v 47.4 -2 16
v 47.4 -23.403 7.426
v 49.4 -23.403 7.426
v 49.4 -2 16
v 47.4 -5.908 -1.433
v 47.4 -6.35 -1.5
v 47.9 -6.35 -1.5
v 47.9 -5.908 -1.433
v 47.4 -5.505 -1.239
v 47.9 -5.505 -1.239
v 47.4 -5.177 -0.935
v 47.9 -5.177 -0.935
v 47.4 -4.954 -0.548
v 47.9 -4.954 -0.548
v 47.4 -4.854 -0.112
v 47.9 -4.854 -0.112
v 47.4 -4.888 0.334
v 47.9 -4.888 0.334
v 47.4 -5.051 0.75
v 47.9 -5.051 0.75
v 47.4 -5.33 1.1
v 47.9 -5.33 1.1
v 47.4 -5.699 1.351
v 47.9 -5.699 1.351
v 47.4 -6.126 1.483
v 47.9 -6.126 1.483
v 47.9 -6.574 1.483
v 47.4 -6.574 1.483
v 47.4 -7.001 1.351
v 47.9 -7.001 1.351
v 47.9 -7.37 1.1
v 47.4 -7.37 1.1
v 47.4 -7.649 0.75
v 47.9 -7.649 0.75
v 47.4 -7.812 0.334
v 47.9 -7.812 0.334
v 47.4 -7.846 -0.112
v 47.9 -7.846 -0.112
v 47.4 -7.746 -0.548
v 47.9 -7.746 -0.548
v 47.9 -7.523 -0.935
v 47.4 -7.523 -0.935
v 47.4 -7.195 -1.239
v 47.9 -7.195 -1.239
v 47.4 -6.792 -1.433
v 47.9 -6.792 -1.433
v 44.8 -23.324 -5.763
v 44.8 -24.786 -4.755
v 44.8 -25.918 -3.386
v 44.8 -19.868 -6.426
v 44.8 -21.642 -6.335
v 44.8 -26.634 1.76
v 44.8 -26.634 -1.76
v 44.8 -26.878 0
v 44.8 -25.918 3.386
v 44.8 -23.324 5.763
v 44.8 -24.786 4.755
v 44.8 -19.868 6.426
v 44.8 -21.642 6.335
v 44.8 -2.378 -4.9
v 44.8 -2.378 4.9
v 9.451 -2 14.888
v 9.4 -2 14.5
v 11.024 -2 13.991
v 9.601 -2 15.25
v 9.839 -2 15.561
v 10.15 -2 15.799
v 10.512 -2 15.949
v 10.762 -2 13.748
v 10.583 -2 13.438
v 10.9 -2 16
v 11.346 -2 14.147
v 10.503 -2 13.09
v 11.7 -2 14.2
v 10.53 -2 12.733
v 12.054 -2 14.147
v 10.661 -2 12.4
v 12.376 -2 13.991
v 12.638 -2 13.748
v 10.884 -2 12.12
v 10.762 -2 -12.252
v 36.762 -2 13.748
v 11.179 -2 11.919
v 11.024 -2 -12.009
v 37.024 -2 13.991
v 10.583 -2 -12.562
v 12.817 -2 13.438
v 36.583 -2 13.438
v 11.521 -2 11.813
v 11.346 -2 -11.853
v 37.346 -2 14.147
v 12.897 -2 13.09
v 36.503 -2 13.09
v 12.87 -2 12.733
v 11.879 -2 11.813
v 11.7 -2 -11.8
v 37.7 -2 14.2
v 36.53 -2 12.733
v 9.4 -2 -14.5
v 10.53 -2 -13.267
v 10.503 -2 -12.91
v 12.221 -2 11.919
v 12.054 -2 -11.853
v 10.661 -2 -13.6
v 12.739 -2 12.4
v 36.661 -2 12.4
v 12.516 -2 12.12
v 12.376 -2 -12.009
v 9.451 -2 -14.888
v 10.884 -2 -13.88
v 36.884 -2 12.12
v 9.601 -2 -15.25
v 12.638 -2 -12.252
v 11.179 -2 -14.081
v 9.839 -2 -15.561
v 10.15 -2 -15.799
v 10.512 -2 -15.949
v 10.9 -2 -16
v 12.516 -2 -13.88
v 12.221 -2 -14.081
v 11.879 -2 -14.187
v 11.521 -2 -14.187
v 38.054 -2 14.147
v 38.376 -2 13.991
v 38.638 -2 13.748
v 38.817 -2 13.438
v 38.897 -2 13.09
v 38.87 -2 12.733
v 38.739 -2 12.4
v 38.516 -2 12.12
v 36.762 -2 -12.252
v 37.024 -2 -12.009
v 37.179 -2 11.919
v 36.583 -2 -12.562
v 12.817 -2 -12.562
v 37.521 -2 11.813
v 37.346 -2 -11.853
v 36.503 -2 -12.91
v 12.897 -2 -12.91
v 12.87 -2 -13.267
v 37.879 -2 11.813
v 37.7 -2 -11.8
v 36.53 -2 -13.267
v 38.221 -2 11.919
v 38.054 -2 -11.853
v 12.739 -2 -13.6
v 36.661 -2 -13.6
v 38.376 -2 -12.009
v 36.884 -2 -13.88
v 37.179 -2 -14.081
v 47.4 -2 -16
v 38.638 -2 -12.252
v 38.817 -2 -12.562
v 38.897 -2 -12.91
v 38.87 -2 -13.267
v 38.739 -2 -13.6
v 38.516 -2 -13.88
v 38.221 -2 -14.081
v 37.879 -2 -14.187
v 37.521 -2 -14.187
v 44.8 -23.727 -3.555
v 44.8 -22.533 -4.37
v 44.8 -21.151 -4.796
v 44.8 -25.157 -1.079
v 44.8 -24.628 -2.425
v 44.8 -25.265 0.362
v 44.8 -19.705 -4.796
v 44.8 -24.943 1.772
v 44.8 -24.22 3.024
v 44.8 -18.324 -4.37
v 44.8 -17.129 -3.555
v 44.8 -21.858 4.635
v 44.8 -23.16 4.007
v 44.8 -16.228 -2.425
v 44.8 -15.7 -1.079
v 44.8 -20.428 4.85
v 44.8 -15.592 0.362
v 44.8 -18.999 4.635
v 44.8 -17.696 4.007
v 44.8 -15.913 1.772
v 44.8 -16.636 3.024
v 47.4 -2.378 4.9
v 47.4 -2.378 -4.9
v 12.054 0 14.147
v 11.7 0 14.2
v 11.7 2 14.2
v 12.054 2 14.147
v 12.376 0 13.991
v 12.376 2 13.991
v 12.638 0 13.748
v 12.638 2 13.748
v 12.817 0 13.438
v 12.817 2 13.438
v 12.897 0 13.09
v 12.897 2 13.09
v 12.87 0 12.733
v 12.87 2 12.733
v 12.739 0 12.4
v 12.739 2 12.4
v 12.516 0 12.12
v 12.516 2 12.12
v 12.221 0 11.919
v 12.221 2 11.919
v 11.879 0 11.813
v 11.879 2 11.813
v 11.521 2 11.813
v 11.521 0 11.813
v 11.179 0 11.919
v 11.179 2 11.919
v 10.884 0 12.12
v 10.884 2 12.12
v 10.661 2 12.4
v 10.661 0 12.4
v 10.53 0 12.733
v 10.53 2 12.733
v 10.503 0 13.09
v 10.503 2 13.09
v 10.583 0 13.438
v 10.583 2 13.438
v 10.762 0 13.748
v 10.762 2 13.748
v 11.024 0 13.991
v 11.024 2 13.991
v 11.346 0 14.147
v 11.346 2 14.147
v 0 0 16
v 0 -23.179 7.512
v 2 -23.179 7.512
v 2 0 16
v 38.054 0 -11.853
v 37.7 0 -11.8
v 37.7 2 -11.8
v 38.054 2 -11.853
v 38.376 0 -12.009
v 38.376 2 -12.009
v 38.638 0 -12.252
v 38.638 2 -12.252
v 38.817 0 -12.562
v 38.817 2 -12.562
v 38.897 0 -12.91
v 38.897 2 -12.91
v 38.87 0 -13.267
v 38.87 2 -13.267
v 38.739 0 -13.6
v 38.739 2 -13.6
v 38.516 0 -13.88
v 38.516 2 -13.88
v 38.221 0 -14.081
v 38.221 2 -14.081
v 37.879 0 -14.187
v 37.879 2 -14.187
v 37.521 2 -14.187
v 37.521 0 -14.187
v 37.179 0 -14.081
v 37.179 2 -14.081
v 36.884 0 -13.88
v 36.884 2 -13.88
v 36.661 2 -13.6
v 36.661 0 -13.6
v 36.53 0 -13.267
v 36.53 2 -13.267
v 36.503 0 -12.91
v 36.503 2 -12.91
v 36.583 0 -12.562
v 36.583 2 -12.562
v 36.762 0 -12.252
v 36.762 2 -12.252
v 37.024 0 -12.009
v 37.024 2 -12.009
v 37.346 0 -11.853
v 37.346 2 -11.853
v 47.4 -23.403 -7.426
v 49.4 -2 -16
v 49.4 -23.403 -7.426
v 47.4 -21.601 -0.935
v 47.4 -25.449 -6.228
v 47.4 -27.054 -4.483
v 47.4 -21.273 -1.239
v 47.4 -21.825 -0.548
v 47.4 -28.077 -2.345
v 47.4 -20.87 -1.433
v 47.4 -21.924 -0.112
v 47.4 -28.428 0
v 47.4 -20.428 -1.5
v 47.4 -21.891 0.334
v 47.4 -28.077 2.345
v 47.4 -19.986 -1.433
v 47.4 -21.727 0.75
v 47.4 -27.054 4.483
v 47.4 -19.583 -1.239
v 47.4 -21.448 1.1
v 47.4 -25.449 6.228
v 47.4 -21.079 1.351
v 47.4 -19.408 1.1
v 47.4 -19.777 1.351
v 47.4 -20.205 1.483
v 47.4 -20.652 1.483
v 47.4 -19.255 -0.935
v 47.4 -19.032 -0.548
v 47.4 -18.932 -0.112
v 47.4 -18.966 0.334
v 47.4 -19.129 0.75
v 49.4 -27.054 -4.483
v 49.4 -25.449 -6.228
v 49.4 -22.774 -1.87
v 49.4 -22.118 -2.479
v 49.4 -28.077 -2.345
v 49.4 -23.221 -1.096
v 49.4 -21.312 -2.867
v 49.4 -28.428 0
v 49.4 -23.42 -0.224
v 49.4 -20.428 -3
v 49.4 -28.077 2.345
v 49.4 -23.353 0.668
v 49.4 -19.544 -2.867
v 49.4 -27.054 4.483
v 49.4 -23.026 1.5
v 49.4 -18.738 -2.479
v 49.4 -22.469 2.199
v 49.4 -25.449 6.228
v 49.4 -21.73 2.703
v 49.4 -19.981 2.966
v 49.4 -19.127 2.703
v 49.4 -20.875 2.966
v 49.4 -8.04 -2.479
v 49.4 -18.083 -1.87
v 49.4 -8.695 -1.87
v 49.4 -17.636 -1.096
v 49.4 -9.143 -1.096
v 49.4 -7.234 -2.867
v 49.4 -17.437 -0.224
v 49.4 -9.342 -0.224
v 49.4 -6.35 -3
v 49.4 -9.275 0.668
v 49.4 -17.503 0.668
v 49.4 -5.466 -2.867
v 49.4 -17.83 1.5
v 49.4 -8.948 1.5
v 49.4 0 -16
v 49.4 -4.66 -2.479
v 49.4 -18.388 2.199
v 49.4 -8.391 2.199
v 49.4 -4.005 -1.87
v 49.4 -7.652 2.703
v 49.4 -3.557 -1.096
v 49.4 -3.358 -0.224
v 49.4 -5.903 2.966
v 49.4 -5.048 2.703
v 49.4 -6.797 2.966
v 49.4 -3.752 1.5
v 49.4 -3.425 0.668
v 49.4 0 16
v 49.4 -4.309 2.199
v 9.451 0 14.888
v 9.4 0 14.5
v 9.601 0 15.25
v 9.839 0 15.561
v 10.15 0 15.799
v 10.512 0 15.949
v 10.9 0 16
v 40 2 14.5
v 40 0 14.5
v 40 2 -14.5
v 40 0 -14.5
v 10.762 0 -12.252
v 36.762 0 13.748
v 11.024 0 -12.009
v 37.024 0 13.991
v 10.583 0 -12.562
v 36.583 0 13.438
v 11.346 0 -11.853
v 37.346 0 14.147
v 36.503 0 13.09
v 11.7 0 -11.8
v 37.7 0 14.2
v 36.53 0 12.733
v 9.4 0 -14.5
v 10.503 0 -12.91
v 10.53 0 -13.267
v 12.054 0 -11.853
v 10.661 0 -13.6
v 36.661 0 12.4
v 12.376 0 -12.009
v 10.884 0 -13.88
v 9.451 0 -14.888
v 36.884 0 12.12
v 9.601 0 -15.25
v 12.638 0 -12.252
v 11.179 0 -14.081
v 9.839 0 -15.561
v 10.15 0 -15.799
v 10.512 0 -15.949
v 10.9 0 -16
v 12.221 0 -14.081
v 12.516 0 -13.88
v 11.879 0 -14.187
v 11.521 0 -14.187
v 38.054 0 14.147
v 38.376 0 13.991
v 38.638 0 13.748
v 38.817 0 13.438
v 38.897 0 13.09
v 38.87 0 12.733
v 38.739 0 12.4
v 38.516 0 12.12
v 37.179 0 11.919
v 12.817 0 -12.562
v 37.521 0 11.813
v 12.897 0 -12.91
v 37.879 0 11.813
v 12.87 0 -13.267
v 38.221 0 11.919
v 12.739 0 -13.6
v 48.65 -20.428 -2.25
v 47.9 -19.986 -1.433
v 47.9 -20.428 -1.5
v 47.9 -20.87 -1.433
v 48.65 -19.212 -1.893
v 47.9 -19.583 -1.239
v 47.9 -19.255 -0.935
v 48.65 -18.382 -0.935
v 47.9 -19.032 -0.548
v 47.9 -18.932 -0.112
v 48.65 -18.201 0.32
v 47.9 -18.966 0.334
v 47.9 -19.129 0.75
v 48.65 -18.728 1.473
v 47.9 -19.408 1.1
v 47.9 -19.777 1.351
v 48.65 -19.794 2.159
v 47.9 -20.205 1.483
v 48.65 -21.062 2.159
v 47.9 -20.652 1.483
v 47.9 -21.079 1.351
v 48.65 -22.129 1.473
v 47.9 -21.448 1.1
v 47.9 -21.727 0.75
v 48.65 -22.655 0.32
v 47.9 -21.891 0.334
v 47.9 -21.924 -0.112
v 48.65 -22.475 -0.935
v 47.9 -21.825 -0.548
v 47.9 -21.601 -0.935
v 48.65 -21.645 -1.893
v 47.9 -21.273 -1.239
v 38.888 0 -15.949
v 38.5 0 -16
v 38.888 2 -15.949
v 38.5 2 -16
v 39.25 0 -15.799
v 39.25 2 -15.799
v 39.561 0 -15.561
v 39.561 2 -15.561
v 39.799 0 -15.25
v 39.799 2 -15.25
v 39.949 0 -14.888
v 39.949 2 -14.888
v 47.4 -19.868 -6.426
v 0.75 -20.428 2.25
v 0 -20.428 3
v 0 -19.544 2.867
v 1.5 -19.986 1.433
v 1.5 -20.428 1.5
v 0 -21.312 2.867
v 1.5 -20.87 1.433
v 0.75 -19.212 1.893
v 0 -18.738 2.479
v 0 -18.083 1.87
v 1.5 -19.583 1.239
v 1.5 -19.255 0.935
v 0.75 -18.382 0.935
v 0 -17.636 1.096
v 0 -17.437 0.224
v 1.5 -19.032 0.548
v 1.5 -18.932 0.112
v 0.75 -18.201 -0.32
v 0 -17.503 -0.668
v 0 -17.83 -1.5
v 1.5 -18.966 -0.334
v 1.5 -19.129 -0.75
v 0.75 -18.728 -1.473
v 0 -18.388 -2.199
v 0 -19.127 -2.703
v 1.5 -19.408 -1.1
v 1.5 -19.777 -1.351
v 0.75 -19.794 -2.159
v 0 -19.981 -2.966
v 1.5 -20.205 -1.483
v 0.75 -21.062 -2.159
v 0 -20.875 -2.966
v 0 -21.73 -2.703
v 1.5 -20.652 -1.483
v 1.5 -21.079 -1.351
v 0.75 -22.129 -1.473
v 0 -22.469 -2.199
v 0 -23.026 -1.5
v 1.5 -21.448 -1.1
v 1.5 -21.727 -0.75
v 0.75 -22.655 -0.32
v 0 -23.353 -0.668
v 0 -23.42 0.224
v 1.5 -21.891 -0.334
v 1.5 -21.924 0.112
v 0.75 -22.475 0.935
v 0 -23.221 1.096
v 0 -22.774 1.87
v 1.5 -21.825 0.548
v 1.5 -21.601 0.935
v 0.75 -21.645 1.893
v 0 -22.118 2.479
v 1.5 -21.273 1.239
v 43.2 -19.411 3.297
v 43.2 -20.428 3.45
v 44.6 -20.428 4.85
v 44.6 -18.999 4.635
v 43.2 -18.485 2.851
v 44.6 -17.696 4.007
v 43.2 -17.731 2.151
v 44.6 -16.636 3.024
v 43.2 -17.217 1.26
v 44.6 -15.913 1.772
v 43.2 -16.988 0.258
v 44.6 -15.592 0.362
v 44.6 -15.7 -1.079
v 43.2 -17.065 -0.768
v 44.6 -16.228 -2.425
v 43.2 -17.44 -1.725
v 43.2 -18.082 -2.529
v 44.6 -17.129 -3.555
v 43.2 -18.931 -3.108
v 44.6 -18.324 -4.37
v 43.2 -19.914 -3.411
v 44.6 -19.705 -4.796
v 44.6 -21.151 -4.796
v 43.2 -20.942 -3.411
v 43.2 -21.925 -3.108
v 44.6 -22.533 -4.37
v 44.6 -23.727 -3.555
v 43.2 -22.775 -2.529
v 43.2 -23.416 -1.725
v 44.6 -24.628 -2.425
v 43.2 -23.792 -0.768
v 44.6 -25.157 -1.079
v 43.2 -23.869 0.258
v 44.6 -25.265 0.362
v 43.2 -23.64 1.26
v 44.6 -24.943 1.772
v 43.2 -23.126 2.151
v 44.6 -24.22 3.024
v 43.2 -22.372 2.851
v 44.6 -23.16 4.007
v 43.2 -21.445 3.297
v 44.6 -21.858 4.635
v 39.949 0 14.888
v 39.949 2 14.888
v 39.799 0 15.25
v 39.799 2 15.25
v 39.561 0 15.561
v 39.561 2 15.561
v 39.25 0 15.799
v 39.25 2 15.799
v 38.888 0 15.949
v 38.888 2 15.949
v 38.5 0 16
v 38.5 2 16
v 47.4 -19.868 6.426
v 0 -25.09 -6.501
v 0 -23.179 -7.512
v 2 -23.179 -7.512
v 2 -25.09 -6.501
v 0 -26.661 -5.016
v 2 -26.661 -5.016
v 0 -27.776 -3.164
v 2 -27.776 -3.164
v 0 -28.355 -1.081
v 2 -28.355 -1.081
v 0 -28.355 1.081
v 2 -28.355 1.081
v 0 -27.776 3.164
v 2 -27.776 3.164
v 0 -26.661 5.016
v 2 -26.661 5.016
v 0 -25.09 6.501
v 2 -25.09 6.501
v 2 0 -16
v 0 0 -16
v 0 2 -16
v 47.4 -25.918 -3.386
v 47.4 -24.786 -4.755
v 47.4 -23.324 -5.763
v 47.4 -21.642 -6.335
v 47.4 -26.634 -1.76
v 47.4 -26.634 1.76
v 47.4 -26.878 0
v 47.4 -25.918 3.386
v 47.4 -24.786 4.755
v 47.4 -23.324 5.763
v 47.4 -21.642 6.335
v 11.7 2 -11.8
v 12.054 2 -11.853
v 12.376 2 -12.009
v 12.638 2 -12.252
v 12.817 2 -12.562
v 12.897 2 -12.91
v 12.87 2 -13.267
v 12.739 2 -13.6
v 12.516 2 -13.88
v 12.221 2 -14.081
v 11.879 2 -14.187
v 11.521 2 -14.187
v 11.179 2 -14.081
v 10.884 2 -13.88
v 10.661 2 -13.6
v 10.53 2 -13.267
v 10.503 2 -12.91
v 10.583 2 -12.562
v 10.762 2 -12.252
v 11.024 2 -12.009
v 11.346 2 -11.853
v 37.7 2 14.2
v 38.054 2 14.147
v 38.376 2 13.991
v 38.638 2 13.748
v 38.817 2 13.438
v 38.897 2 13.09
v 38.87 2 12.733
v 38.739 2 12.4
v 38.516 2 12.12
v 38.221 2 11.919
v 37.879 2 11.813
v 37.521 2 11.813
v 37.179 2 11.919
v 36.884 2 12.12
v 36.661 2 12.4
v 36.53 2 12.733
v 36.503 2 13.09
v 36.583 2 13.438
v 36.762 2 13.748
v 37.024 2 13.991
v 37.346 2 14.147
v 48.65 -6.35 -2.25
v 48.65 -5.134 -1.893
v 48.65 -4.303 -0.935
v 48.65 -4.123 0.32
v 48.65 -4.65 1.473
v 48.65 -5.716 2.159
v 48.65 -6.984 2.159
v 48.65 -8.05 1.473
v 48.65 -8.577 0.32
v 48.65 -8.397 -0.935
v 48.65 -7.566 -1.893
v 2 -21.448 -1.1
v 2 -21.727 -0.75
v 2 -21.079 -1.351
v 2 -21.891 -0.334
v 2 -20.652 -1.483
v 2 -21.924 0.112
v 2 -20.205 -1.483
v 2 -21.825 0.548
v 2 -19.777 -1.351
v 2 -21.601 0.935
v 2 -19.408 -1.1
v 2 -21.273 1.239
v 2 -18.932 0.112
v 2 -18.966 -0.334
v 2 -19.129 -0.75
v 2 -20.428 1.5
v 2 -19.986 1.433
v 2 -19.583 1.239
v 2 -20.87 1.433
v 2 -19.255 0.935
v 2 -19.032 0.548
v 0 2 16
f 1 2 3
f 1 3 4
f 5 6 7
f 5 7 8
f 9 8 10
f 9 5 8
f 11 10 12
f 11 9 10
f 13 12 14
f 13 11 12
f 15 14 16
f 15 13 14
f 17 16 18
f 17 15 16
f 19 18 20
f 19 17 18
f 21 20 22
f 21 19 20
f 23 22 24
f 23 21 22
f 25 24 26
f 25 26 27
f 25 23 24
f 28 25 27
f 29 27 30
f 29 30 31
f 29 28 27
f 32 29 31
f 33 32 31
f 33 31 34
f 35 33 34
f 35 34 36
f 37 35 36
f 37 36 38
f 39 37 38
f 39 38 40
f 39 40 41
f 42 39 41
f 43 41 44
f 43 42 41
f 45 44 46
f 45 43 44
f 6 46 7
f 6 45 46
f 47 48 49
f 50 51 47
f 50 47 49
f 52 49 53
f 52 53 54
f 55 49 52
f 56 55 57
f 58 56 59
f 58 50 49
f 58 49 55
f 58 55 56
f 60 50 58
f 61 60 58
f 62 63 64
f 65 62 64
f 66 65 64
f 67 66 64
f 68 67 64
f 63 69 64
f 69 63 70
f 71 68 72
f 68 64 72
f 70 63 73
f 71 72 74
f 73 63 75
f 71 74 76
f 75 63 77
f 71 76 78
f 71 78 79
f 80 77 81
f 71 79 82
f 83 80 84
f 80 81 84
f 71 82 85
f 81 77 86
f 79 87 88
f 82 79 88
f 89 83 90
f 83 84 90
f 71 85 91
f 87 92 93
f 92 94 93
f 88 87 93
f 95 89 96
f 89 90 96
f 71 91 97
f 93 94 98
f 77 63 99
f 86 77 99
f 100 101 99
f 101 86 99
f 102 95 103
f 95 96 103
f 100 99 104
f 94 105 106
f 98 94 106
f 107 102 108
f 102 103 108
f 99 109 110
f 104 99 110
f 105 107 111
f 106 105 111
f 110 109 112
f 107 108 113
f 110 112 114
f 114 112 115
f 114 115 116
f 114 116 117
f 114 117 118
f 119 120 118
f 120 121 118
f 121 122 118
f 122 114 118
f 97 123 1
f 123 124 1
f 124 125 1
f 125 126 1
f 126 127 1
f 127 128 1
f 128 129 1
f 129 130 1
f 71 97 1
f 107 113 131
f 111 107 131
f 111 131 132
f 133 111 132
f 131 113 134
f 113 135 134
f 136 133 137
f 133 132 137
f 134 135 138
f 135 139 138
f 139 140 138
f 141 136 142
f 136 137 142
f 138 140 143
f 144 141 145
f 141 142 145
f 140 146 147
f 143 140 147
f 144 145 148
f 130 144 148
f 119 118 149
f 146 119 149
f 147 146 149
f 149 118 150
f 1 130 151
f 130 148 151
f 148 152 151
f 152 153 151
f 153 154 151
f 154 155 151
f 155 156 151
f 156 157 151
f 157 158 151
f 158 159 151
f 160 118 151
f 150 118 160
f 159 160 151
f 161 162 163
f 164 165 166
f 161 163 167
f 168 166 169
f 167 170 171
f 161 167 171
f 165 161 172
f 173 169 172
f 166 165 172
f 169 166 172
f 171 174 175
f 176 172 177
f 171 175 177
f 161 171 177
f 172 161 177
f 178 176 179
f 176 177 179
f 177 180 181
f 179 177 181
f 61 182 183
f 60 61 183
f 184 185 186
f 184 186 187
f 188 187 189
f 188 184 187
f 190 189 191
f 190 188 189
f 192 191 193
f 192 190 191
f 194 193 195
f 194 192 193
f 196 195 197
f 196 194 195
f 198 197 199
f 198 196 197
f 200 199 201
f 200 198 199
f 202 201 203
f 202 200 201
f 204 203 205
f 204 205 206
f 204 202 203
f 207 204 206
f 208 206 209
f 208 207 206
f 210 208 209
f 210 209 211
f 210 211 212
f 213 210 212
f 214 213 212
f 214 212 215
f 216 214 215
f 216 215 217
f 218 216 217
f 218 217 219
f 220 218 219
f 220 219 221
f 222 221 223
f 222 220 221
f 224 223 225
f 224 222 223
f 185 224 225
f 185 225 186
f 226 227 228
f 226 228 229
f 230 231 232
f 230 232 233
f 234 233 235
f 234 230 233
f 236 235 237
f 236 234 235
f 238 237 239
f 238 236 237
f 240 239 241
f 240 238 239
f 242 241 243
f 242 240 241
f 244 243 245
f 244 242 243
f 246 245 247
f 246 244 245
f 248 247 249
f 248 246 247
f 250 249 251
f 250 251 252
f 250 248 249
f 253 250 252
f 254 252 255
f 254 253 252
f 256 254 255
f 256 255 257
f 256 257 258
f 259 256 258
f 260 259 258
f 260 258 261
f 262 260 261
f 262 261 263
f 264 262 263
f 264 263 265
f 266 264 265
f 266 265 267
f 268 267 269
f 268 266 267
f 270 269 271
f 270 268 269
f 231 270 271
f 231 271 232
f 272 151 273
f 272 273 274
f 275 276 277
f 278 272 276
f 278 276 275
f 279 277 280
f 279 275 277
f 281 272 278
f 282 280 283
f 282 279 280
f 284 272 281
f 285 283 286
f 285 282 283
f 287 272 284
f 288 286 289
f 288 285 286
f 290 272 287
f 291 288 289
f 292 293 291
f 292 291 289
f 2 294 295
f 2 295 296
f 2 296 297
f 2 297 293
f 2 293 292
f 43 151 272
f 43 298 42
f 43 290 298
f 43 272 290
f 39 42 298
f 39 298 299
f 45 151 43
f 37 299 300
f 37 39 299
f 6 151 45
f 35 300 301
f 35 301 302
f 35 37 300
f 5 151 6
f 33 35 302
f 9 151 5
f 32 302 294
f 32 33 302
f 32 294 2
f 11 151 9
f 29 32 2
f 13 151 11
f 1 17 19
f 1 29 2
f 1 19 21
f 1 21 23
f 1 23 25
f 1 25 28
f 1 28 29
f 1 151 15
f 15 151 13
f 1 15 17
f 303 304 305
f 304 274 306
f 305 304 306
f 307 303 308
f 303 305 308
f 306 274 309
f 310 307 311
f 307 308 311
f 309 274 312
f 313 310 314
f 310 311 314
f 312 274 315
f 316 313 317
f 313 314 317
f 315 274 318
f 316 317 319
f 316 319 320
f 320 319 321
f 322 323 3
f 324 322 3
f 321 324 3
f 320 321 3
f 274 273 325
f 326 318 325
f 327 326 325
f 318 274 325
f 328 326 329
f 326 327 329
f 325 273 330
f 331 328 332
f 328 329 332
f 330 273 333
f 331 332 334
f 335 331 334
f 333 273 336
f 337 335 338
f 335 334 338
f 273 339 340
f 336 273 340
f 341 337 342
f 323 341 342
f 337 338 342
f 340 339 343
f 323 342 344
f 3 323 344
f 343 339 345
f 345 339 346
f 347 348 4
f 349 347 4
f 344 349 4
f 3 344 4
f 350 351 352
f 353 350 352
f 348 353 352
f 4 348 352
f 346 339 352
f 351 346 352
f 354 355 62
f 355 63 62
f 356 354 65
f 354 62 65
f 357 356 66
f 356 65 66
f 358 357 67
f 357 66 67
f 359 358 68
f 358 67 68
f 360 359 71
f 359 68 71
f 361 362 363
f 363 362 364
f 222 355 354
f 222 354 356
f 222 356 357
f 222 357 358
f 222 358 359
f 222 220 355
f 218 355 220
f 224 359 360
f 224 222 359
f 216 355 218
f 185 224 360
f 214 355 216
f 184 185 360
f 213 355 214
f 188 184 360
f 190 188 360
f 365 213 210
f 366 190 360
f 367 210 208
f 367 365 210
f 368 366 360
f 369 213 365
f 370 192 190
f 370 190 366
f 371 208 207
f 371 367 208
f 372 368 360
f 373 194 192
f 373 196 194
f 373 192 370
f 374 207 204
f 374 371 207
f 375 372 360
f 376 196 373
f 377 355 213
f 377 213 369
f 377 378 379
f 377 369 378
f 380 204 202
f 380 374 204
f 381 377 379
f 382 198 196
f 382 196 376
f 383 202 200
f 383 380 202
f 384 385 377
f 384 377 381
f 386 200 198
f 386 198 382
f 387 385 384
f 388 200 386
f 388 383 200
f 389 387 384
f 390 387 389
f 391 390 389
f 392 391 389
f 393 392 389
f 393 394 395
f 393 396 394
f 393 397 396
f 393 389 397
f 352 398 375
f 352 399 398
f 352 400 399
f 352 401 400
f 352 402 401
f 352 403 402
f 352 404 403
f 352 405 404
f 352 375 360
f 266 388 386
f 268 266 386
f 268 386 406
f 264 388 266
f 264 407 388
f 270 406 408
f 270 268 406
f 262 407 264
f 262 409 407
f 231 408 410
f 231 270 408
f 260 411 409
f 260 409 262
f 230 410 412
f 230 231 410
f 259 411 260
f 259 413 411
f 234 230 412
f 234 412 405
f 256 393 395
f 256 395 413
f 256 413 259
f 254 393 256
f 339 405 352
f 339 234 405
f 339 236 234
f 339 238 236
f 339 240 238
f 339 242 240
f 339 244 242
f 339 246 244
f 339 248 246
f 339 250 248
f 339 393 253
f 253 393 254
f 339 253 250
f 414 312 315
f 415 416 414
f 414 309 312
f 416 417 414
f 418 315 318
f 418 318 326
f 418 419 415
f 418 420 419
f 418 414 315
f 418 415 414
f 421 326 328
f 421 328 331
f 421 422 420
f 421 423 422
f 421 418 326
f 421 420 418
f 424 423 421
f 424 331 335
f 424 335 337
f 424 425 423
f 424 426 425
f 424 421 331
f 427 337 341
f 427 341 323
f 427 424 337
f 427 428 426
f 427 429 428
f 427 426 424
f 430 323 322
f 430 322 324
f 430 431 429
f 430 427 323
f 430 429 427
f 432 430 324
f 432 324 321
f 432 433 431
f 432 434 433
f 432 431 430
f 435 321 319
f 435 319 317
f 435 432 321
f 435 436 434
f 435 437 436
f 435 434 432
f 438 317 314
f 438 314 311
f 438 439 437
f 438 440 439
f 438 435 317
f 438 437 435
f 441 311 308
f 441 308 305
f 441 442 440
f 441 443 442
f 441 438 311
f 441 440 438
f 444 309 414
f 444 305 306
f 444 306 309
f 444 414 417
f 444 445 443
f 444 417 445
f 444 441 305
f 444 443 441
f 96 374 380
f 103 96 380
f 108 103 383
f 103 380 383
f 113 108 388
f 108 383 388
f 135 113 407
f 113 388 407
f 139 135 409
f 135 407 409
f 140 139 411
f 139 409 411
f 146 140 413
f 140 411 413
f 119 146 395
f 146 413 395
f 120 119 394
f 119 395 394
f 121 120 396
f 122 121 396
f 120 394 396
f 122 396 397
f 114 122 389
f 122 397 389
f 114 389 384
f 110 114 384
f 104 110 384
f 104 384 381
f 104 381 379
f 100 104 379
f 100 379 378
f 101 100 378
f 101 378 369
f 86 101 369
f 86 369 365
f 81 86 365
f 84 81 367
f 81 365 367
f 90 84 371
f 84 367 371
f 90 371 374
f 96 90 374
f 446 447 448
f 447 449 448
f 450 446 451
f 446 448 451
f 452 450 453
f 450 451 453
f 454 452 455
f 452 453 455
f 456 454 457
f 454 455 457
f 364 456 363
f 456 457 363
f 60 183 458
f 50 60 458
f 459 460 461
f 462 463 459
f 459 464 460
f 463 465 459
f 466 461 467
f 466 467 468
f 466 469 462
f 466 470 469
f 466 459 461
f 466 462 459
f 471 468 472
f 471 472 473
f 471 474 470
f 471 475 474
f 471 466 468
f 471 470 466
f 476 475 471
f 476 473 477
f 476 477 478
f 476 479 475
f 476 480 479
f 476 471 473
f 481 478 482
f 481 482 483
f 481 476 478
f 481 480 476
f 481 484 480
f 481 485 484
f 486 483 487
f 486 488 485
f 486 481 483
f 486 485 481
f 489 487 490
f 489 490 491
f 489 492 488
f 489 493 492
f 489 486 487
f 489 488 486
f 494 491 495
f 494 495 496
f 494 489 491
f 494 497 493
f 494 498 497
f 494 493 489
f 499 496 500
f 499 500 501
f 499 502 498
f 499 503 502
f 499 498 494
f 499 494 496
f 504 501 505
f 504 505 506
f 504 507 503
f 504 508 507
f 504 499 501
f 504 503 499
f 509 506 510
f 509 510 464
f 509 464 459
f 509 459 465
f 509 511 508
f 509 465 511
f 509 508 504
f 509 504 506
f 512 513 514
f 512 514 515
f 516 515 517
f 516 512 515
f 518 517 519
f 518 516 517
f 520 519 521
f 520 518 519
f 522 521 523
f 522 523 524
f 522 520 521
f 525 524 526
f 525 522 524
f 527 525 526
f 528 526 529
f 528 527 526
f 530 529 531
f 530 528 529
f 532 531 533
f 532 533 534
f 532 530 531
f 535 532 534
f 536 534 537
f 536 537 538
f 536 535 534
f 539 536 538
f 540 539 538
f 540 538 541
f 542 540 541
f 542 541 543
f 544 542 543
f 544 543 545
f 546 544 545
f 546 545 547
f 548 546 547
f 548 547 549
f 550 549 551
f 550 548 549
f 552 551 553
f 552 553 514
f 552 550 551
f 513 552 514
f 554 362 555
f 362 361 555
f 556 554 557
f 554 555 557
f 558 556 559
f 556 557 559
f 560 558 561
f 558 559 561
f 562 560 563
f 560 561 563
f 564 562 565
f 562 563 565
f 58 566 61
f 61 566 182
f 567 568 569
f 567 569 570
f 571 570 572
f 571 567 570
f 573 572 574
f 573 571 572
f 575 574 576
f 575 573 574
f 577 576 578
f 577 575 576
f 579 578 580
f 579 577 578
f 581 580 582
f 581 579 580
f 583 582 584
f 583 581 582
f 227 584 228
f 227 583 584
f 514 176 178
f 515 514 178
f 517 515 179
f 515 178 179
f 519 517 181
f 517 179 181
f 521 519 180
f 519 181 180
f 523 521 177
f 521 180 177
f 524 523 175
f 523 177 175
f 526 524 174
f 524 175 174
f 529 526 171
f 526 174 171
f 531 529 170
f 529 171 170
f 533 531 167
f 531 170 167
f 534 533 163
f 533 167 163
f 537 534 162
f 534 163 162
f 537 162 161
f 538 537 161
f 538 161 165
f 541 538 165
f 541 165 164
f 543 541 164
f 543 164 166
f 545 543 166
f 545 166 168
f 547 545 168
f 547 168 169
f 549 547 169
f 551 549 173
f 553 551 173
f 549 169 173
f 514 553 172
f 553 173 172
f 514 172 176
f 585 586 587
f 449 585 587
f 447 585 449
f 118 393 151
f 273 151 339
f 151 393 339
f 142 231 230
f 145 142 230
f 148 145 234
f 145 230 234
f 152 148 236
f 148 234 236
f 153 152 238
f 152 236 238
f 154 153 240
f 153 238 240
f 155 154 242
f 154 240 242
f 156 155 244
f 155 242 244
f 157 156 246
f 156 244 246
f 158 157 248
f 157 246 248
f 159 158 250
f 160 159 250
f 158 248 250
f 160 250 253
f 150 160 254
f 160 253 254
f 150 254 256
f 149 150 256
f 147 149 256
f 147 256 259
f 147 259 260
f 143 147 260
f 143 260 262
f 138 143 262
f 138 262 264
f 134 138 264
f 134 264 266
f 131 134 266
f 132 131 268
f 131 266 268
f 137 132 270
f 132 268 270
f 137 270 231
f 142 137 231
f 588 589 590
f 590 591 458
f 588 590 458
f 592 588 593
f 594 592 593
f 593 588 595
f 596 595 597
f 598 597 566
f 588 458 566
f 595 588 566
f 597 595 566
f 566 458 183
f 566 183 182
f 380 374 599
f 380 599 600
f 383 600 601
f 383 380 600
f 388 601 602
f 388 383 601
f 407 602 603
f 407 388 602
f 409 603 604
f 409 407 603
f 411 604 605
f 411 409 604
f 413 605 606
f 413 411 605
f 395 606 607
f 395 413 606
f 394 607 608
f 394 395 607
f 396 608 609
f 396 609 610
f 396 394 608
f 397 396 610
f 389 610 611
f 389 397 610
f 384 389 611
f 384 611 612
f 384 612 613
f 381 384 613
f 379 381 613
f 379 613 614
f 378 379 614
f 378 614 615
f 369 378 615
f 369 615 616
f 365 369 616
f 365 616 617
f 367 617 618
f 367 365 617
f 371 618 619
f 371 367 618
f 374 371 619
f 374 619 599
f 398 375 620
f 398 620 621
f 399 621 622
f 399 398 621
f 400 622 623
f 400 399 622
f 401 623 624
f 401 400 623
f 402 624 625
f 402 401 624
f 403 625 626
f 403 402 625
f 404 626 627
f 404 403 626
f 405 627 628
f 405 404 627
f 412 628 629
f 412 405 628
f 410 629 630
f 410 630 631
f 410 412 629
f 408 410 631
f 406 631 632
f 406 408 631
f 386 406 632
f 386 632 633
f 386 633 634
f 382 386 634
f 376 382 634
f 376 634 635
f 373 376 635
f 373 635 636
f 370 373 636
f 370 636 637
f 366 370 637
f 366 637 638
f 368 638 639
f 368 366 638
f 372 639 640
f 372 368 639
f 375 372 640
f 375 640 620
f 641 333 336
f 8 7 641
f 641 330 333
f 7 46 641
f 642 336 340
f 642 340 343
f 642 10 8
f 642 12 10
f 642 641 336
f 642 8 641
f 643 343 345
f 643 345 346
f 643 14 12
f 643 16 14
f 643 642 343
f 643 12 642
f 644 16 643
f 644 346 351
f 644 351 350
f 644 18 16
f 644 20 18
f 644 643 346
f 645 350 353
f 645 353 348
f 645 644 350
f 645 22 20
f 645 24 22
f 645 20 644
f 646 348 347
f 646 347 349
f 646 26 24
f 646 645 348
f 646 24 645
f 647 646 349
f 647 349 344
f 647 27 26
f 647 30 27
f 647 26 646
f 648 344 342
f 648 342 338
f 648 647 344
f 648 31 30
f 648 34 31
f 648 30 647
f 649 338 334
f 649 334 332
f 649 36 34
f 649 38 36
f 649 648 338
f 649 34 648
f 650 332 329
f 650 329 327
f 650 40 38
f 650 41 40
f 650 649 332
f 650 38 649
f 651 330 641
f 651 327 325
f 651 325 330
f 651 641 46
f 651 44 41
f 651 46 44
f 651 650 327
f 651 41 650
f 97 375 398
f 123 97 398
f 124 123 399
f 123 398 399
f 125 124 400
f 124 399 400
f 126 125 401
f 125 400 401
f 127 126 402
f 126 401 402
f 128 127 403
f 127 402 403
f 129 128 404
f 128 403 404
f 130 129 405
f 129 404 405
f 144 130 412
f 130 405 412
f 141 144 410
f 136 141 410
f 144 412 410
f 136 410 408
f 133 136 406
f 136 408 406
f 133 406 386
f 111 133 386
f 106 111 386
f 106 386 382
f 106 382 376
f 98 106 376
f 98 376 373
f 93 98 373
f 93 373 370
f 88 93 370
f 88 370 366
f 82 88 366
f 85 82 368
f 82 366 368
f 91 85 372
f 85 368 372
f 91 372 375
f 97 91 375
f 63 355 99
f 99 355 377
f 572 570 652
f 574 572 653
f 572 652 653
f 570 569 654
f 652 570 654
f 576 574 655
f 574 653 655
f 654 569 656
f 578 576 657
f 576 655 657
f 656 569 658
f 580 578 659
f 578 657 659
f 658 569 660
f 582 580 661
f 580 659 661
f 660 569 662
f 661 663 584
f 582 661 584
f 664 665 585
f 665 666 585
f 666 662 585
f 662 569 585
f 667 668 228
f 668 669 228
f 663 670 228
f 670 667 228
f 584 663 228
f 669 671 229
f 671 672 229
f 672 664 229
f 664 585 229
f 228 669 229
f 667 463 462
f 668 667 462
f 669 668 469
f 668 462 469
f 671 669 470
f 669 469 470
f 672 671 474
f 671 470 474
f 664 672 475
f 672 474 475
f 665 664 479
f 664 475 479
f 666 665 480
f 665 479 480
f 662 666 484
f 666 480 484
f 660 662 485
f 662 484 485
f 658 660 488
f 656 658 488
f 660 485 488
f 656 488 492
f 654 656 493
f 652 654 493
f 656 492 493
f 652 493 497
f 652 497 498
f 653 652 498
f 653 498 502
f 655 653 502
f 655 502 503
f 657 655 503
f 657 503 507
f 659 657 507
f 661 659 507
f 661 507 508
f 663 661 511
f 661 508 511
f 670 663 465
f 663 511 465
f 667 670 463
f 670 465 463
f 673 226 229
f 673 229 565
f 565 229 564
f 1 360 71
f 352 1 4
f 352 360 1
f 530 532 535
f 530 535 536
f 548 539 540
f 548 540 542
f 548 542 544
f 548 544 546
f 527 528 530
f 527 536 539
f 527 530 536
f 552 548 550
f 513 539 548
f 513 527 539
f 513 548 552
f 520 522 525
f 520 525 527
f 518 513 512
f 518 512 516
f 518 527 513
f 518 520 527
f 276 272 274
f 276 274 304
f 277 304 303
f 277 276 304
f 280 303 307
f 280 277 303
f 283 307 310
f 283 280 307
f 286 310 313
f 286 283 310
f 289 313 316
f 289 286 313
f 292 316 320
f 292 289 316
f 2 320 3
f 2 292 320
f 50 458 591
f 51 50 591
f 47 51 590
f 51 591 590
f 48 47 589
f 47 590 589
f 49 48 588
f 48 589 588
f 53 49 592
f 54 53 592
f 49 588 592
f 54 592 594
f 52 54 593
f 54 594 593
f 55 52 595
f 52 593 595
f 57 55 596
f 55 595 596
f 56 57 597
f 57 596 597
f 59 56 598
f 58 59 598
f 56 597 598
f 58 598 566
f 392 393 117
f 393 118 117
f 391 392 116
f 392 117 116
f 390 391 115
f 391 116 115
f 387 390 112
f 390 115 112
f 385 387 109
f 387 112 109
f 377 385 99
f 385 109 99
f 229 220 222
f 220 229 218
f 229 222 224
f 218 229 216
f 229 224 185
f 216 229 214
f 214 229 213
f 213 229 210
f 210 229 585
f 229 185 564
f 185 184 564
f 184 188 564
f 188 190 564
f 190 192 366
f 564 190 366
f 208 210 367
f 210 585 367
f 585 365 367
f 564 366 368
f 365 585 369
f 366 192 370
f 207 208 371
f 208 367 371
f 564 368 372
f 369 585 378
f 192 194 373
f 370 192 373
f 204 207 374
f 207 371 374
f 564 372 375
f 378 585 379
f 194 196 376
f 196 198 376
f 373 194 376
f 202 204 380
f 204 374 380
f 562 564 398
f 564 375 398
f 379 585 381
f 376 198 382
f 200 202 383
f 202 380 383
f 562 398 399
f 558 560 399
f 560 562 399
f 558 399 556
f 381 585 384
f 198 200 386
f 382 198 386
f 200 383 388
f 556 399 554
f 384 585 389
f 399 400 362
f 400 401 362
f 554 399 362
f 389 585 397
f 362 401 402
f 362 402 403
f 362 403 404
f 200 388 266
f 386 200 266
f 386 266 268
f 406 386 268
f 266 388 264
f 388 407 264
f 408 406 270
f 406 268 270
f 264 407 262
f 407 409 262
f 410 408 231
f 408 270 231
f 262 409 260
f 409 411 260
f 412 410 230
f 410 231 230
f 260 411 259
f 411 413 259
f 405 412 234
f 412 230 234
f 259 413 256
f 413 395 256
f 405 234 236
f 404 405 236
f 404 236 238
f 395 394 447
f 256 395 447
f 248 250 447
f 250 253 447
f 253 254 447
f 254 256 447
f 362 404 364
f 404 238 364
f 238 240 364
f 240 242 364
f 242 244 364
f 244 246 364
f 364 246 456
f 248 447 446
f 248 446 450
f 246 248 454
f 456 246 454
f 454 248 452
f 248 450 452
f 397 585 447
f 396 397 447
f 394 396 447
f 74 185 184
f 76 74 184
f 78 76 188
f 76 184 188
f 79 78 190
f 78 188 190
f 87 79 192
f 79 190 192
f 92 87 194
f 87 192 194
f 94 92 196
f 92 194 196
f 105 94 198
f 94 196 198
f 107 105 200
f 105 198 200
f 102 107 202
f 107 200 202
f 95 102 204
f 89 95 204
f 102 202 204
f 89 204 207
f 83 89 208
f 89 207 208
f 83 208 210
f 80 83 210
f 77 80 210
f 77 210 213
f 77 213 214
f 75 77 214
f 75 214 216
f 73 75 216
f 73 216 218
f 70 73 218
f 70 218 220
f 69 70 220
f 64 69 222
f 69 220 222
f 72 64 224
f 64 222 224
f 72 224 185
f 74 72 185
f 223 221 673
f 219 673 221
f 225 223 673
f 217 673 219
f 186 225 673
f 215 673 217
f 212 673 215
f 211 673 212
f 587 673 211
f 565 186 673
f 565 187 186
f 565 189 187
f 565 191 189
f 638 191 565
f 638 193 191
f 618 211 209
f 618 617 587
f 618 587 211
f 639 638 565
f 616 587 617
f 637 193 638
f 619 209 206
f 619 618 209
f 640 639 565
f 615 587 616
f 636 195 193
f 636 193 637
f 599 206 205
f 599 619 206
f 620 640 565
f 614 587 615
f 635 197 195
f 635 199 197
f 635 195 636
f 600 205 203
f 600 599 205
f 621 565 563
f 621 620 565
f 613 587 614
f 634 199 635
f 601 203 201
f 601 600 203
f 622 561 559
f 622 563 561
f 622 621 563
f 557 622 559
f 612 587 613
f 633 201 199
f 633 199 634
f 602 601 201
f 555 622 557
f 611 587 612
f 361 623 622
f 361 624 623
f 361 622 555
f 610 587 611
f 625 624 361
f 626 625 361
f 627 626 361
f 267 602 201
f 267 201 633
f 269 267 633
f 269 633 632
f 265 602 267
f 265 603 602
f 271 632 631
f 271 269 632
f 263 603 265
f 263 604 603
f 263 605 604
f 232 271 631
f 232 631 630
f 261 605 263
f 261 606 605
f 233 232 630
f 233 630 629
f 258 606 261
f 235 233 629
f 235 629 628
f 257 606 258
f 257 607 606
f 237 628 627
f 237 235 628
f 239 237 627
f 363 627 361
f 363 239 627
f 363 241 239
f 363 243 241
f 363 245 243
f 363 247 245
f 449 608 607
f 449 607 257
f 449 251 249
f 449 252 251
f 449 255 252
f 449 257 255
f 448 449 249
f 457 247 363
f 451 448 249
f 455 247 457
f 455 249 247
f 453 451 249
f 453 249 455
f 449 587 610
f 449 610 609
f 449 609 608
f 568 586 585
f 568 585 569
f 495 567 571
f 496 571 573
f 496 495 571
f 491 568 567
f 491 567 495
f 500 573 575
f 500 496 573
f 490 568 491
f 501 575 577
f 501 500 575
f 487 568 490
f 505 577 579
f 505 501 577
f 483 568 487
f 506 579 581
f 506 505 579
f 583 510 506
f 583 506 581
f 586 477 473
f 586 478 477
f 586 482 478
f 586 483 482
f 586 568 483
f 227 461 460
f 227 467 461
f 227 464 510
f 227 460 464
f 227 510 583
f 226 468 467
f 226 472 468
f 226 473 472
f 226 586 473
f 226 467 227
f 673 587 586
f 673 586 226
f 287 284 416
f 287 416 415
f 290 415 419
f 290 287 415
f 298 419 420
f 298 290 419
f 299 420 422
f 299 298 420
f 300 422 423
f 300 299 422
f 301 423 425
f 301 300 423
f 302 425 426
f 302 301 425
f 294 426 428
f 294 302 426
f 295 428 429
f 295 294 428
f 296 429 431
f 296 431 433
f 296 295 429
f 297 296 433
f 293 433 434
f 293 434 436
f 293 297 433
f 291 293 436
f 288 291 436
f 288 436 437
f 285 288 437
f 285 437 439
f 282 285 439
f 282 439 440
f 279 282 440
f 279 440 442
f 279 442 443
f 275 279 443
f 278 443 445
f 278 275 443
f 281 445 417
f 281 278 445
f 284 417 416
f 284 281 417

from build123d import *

# Parameters (mm, degrees)
SKETCH_1_W        = 40
SKETCH_1_H        = 32
SKETCH_1_R        = 1.2
EXTRUDE_1_DEPTH   = 2
SKETCH_2_W        = 40
SKETCH_2_H        = 32
SKETCH_2_R        = 1.2
EXTRUDE_2_DEPTH   = 2
SKETCH_3_R        = 1.5
EXTRUDE_1_2_DEPTH = 2
EXTRUDE_START     = -2
SKETCH_4_R        = 1.5
EXTRUDE_2_2_DEPTH = 2
FILLET_1_R        = 1.5
FILLET_2_R        = 1.5
CHAMFER_1_SIZE    = 1.5
CHAMFER_2_SIZE    = 1.5
EXTRUDE_5_DEPTH   = 2.6
SKETCH_6_R        = 4.85
EXTRUDE_6_DEPTH   = 1.6
CHAMFER_3_SIZE    = 1.4


with BuildPart() as part:
    # Эскиз1 → Extrude 1 (new body)
    with BuildSketch(Plane(origin=(0, 0, 0), x_dir=(1, 0, 0), z_dir=(0, 1, 0))):
        with Locations((20, 0)):
            Rectangle(SKETCH_1_W, SKETCH_1_H)
        with Locations((11.7, 13)):
            Circle(SKETCH_1_R, mode=Mode.SUBTRACT)
        with Locations((37.7, 13)):
            Circle(SKETCH_1_R, mode=Mode.SUBTRACT)
        with Locations((37.7, -13)):
            Circle(SKETCH_1_R, mode=Mode.SUBTRACT)
        with Locations((11.7, -13)):
            Circle(SKETCH_1_R, mode=Mode.SUBTRACT)
    extrude(amount=EXTRUDE_1_DEPTH)

    # Эскиз3 → Extrude 1 2 (add)
    with BuildSketch(Plane.ZY):
        with BuildLine():
            Line((-16, 0), (-7.512179228, -23.179047732))
            ThreePointArc((-7.512179228, -23.179047732), (0, -28.4282), (7.512179228, -23.179047732))
            Line((7.512179228, -23.179047732), (16, 0))
            Line((16, 0), (-16, 0))
        make_face()
        with Locations((0, -20.4282)):
            Circle(SKETCH_3_R, mode=Mode.SUBTRACT)
    extrude(amount=-EXTRUDE_1_2_DEPTH)

    # Скругление2
    fillet_2_edges = [part.edges().sort_by_distance(p)[0] for p in [
        (40, 1, -16),
        (40, 1, 16),
    ]]
    fillet(fillet_2_edges, radius=FILLET_2_R)

    # Фаска2
    chamfer_2_edges = [part.edges().sort_by_distance(p)[0] for p in [
        (0, -20.4282, -1.5),
    ]]
    chamfer(chamfer_2_edges, length=CHAMFER_2_SIZE)


with BuildPart() as body_2:
    # Эскиз2 → Extrude 2 (new body)
    with BuildSketch(Plane(origin=(0, 0, 0), x_dir=(1, 0, 0), z_dir=(0, 1, 0))):
        with Locations((29.4, 0)):
            Rectangle(SKETCH_2_W, SKETCH_2_H)
        with Locations((11.7, 13)):
            Circle(SKETCH_2_R, mode=Mode.SUBTRACT)
        with Locations((37.7, 13)):
            Circle(SKETCH_2_R, mode=Mode.SUBTRACT)
        with Locations((37.7, -13)):
            Circle(SKETCH_2_R, mode=Mode.SUBTRACT)
        with Locations((11.7, -13)):
            Circle(SKETCH_2_R, mode=Mode.SUBTRACT)
    extrude(amount=-EXTRUDE_2_DEPTH)

    # Эскиз4 → Extrude 2 2 (add)
    with BuildSketch(Plane(origin=(49.4, 0, 0), x_dir=(0, 0, -1), z_dir=(1, 0, 0)).offset(EXTRUDE_START)):
        with BuildLine():
            Line((16, -2), (7.426322109, -23.403051246))
            ThreePointArc((7.426322109, -23.403051246), (0, -28.4282), (-7.426322109, -23.403051246))
            Line((-7.426322109, -23.403051246), (-16, -2))
            Line((-16, -2), (16, -2))
        make_face()
        with Locations((0, -20.4282)):
            Circle(SKETCH_4_R, mode=Mode.SUBTRACT)
        with Locations((0, -6.35)):
            Circle(SKETCH_4_R, mode=Mode.SUBTRACT)
    extrude(amount=EXTRUDE_2_2_DEPTH)

    # Скругление1
    fillet_1_edges = [body_2.edges().sort_by_distance(p)[0] for p in [
        (9.4, -1, 16),
        (9.4, -1, -16),
    ]]
    fillet(fillet_1_edges, radius=FILLET_1_R)

    # Фаска1
    chamfer_1_edges = [body_2.edges().sort_by_distance(p)[0] for p in [
        (49.4, -20.4282, 1.5),
        (49.4, -6.35, 1.5),
    ]]
    chamfer(chamfer_1_edges, length=CHAMFER_1_SIZE)


with BuildPart() as body_3:
    # Эскиз5 → Бобышка-Вытянуть5 (new body)
    with BuildSketch(Plane.ZY.offset(-47.4)):
        with BuildLine():
            Line((4.9, -2.3782), (-4.9, -2.3782))
            Line((-4.9, -2.3782), (-6.425600177, -19.867698109))
            ThreePointArc((-6.425600177, -19.867698109), (0, -26.8782), (6.425600177, -19.867698109))
            Line((6.425600177, -19.867698109), (4.9, -2.3782))
        make_face()
    extrude(amount=EXTRUDE_5_DEPTH)


with BuildPart() as body_4:
    # Эскиз6 → Бобышка-Вытянуть6 (new body)
    with BuildSketch(Plane.ZY.offset(-44.8)):
        with Locations((0, -20.4282)):
            Circle(SKETCH_6_R)
    extrude(amount=EXTRUDE_6_DEPTH)

    # Фаска3
    chamfer_3_edges = [body_4.edges().sort_by_distance(p)[0] for p in [
        (43.2, -20.4282, -4.85),
    ]]
    chamfer(chamfer_3_edges, length=CHAMFER_3_SIZE)


solid = Compound([part.part, body_2.part, body_3.part, body_4.part])
